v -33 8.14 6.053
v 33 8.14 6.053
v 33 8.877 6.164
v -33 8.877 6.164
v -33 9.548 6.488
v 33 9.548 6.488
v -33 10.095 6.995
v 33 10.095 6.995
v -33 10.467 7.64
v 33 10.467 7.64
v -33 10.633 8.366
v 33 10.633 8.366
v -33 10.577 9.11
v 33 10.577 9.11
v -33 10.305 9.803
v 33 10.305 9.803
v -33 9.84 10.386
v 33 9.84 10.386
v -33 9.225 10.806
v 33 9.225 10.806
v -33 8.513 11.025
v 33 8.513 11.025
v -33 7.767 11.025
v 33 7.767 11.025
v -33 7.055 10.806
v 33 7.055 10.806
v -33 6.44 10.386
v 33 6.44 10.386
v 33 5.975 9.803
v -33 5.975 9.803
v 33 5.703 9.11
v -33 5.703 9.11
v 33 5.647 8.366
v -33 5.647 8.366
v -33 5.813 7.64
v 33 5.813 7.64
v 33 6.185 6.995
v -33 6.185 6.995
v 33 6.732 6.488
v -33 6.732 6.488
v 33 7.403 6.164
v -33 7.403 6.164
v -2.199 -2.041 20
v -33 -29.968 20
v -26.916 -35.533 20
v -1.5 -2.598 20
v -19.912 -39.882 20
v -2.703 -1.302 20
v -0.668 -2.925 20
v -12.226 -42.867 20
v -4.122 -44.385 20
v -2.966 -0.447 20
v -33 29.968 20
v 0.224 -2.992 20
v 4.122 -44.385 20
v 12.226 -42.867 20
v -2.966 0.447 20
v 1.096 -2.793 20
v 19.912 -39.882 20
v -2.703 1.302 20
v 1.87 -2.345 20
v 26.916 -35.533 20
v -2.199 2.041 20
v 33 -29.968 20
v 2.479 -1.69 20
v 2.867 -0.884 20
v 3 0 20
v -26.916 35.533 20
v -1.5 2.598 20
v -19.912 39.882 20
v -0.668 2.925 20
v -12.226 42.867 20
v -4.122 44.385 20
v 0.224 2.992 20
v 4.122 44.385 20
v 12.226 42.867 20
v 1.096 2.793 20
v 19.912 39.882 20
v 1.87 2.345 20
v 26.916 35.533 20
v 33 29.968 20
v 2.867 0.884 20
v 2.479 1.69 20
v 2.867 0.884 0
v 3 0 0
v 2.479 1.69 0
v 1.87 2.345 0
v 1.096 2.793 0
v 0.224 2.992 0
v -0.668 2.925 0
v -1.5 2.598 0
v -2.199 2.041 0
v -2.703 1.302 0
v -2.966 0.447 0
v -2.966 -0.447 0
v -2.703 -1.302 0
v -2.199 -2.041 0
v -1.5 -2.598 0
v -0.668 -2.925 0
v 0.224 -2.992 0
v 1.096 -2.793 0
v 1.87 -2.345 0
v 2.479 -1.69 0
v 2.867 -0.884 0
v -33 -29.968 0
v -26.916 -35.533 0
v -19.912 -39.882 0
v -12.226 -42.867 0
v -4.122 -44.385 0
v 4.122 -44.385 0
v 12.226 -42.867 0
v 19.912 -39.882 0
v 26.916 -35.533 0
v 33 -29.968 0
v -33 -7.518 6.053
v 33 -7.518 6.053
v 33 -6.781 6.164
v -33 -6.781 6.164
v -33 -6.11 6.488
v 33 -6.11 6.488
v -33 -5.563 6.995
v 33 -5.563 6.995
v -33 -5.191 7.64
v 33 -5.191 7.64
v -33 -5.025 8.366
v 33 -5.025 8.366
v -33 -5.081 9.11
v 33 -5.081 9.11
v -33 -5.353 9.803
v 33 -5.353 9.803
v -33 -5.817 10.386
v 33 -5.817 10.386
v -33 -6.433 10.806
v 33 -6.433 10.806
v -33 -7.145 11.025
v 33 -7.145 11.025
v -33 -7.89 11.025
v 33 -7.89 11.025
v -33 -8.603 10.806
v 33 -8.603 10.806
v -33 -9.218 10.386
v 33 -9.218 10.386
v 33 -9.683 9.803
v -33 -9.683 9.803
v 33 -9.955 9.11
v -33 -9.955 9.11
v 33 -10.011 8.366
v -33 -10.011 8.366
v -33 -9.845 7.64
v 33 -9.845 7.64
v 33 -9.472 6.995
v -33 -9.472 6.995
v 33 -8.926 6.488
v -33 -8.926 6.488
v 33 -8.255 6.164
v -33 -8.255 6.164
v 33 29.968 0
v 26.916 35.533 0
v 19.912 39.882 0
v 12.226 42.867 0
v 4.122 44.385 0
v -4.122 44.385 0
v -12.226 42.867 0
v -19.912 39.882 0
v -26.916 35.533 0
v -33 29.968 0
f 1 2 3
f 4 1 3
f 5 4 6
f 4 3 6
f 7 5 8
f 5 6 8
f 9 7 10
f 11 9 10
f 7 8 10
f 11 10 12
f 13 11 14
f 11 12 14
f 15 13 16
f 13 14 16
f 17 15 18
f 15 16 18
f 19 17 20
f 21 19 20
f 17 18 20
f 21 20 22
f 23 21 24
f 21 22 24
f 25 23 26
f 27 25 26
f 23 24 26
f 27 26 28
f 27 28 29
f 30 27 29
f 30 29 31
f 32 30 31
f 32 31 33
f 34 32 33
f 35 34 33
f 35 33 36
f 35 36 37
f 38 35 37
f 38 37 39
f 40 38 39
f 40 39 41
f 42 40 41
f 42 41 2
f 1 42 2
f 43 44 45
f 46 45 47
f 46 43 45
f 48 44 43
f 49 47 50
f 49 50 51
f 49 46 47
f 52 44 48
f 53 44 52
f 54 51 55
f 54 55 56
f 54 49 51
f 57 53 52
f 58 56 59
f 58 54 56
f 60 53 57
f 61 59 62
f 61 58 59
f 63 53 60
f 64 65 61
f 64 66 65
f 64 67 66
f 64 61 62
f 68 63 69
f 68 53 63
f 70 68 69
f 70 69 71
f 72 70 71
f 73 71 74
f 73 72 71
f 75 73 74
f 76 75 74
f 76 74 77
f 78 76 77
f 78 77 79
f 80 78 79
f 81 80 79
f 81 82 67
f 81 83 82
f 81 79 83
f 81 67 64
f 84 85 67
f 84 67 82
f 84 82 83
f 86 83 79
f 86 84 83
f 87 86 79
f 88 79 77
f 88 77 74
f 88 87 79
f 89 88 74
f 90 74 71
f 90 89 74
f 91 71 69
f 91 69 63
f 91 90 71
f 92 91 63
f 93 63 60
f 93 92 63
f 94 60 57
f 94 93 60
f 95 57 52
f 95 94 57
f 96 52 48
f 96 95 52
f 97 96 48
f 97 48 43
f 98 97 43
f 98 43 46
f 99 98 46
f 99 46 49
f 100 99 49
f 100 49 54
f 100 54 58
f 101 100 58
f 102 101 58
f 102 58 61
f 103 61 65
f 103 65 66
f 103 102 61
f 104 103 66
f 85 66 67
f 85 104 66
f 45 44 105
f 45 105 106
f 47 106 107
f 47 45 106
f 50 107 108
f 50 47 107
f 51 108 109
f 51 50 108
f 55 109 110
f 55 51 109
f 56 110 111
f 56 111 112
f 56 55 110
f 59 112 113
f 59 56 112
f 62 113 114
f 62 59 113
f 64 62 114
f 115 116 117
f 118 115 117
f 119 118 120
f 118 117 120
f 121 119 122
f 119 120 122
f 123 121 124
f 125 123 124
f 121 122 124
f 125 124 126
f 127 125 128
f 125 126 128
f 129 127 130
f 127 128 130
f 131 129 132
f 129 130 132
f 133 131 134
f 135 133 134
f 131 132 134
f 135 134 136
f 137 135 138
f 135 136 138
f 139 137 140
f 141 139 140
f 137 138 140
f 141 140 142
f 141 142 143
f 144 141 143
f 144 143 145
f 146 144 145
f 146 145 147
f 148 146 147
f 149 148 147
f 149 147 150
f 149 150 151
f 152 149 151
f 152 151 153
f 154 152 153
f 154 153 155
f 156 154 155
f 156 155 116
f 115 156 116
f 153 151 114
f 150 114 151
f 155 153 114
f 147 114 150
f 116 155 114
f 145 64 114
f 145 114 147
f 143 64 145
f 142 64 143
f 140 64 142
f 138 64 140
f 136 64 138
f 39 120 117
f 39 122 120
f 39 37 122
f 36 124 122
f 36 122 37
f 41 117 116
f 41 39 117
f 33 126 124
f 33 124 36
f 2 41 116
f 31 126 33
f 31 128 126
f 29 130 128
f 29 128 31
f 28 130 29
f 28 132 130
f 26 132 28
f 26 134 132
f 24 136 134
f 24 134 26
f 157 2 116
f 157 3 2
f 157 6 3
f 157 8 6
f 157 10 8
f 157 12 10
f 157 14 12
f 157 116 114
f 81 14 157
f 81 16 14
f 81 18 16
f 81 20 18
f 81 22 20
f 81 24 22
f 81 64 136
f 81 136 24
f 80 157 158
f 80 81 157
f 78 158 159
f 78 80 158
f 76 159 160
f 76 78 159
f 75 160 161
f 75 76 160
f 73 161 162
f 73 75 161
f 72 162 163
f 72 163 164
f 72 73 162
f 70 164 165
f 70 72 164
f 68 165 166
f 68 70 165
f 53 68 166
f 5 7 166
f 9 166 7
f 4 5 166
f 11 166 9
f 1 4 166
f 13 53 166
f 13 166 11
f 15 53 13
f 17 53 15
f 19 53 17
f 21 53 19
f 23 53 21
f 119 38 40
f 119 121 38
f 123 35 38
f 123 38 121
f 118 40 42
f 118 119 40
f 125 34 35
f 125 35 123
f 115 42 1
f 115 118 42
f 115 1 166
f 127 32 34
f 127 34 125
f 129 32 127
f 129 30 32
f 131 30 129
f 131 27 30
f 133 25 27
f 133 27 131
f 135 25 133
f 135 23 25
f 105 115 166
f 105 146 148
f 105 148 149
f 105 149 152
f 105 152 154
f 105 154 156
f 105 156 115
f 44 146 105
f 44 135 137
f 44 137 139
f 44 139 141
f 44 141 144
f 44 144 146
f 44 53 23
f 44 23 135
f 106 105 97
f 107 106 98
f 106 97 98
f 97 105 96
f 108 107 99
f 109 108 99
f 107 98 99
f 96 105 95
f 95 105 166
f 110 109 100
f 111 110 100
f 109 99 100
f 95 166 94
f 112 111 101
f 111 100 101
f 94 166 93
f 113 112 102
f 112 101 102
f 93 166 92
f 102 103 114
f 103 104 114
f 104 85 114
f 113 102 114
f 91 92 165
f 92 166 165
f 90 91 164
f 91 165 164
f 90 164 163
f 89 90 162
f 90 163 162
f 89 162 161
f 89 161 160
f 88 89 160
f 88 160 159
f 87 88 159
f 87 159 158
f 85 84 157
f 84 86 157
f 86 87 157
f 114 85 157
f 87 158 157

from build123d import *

# Parameters (mm, degrees)
SKETCH1_R           = 55
SKETCH1_R_2         = 3
BOSS_EXTRUDE1_DEPTH = 20
SKETCH2_R           = 52
CUT_EXTRUDE1_DEPTH  = 10
SKETCH3_R           = 73.645142789
CUT_EXTRUDE2_DEPTH  = 40
CUT_EXTRUDE4_START  = -58
CUT_EXTRUDE4_DEPTH  = 58
SKETCH5_R           = 2.5
CUT_EXTRUDE3_DEPTH  = 110


with BuildPart() as part:
    # Sketch1 → Boss-Extrude1 (new body)
    with BuildSketch(Plane.XY):
        Circle(SKETCH1_R)
        Circle(SKETCH1_R_2, mode=Mode.SUBTRACT)
    extrude(amount=BOSS_EXTRUDE1_DEPTH)

    # Sketch2 → Cut-Extrude1 (cut)
    with BuildSketch(Plane.XY.offset(20)):
        Circle(SKETCH2_R)
        with BuildLine():
            Line((-41.361950208, 16.620711788), (-41.361950208, -16.620711788))
            ThreePointArc((-41.361950208, -16.620711788), (0, -44.576439802), (41.361950208, -16.620711788))
            Line((41.361950208, -16.620711788), (41.361950208, 16.620711788))
            ThreePointArc((41.361950208, 16.620711788), (0, 44.576439802), (-41.361950208, 16.620711788))
        make_face(mode=Mode.SUBTRACT)
    extrude(amount=-CUT_EXTRUDE1_DEPTH, mode=Mode.SUBTRACT)

    # Sketch3 → Cut-Extrude2 (cut)
    with BuildSketch(Plane.XY.offset(20)):
        Circle(SKETCH3_R)
        with BuildLine():
            Line((-41.361950208, 16.620711788), (-41.361950208, -16.620711788))
            ThreePointArc((-41.361950208, -16.620711788), (0, -44.576439802), (41.361950208, -16.620711788))
            Line((41.361950208, -16.620711788), (41.361950208, 16.620711788))
            ThreePointArc((41.361950208, 16.620711788), (0, 44.576439802), (-41.361950208, 16.620711788))
        make_face(mode=Mode.SUBTRACT)
    extrude(amount=-CUT_EXTRUDE2_DEPTH, mode=Mode.SUBTRACT)

    # Sketch6 → Cut-Extrude4 (cut)
    with BuildSketch(Plane(origin=(0, 0, 0), x_dir=(-1, 0, 0), z_dir=(0, 0, -1)).offset(CUT_EXTRUDE4_START)):
        with BuildLine():
            ThreePointArc((-41.361950208, 16.620711788), (-37.775123844, 23.66641088), (-33, 29.967632295))
            Line((-33, 29.967632295), (-58.675122088, 18.005162572))
            Line((-58.675122088, 18.005162572), (-58.675122088, -19.387832384))
            Line((-58.675122088, -19.387832384), (-33, -29.967632295))
            ThreePointArc((-33, -29.967632295), (-37.775123844, -23.66641088), (-41.361950208, -16.620711788))
            Line((-41.361950208, -16.620711788), (-41.361950208, 16.620711788))
        make_face()
        with BuildLine():
            Line((-33, -29.967632295), (-33, 29.967632295))
            ThreePointArc((-33, 29.967632295), (-37.775123844, 23.66641088), (-41.361950208, 16.620711788))
            Line((-41.361950208, 16.620711788), (-41.361950208, -16.620711788))
            ThreePointArc((-41.361950208, -16.620711788), (-37.775123844, -23.66641088), (-33, -29.967632295))
        make_face()
        with BuildLine():
            Line((59.4434713, 26.815208095), (33, 29.967632295))
            ThreePointArc((33, 29.967632295), (37.775123844, 23.66641088), (41.361950208, 16.620711788))
            Line((41.361950208, 16.620711788), (41.361950208, -16.620711788))
            ThreePointArc((41.361950208, -16.620711788), (37.775123844, -23.66641088), (33, -29.967632295))
            Line((33, -29.967632295), (59.4434713, -14.291474717))
            Line((59.4434713, -14.291474717), (59.4434713, 26.815208095))
        make_face()
        with BuildLine():
            ThreePointArc((41.361950208, 16.620711788), (37.775123844, 23.66641088), (33, 29.967632295))
            Line((33, 29.967632295), (33, -29.967632295))
            ThreePointArc((33, -29.967632295), (37.775123844, -23.66641088), (41.361950208, -16.620711788))
            Line((41.361950208, -16.620711788), (41.361950208, 16.620711788))
        make_face()
    extrude(amount=CUT_EXTRUDE4_DEPTH, mode=Mode.SUBTRACT)

    # Sketch5 → Cut-Extrude3 (cut)
    with BuildSketch(Plane(origin=(33, 0, 0), x_dir=(0, 0, -1), z_dir=(1, 0, 0))):
        with Locations((-8.553262896, -7.517843705)):
            Circle(SKETCH5_R)
        with Locations((-8.553262896, 8.14)):
            Circle(SKETCH5_R)
    extrude(amount=-CUT_EXTRUDE3_DEPTH, mode=Mode.SUBTRACT)


solid = part.part
